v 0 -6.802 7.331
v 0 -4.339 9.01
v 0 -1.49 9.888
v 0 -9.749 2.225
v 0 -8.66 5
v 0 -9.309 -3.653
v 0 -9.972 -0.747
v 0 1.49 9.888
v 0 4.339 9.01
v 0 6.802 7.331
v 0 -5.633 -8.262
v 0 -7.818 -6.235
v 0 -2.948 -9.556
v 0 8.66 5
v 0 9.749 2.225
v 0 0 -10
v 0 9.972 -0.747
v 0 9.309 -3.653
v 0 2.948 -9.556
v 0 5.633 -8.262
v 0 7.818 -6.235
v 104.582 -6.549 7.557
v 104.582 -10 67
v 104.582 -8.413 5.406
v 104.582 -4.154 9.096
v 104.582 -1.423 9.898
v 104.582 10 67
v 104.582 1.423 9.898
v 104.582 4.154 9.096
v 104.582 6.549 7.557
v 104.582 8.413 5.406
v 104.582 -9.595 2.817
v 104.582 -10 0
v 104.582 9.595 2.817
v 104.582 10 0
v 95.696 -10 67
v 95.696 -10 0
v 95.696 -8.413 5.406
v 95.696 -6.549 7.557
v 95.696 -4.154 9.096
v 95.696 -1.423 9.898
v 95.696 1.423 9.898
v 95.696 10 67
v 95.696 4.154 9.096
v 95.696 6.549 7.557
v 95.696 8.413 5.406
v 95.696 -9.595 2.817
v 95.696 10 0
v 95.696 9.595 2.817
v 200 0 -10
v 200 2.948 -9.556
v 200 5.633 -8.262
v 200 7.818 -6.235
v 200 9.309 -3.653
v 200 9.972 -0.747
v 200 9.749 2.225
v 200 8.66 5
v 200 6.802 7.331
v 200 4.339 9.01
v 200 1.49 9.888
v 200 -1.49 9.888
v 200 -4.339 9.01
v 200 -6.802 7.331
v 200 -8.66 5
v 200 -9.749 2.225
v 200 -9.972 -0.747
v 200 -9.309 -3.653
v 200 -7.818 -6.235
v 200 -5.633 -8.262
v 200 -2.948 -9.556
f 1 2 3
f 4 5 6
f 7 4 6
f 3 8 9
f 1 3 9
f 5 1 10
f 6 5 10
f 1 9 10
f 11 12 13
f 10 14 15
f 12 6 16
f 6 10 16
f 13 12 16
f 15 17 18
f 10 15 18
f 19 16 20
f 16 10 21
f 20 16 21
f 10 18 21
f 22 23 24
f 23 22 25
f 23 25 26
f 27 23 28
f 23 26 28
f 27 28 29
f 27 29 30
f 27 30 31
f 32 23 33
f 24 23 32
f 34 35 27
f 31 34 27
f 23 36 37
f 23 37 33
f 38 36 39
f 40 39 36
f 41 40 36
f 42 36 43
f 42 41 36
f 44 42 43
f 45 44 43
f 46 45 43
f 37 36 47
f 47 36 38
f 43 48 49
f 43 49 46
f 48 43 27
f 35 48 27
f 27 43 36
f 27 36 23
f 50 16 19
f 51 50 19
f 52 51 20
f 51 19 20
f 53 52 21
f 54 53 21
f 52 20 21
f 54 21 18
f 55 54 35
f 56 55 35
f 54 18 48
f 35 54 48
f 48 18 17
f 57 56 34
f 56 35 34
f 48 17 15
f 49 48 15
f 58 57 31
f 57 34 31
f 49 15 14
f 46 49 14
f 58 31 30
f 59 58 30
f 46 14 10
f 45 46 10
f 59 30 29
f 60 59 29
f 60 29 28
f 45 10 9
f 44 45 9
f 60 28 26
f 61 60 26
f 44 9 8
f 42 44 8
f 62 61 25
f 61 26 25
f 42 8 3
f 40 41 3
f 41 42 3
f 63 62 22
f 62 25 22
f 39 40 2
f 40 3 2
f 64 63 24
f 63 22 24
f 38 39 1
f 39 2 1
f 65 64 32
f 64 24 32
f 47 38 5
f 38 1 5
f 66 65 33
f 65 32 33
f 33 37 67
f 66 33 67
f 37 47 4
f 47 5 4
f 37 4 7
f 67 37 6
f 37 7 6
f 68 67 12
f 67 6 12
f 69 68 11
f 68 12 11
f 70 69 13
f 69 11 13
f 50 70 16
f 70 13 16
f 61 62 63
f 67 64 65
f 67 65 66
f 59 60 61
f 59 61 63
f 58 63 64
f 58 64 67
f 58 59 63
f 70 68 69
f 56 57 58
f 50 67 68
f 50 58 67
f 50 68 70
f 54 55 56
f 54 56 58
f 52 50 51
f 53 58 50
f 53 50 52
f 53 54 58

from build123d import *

# Parameters (mm, degrees)
SKETCH_1_R      = 10
EXTRUDE_1_DEPTH = 200
SKETCH_4_W      = 8.886532998
SKETCH_4_H      = 20
EXTRUDE_2_DEPTH = 67


with BuildPart() as part:
    # 草图1 → 凸台-拉伸1 (new body)
    with BuildSketch(Plane(origin=(0, 0, 0), x_dir=(0, 0, -1), z_dir=(1, 0, 0))):
        Circle(SKETCH_1_R)
    extrude(amount=EXTRUDE_1_DEPTH)

    # 草图4 → 凸台-拉伸2 (add)
    with BuildSketch(Plane.XY):
        with Locations((100.138852078, 0)):
            Rectangle(SKETCH_4_W, SKETCH_4_H)
    extrude(amount=EXTRUDE_2_DEPTH)


solid = part.part
